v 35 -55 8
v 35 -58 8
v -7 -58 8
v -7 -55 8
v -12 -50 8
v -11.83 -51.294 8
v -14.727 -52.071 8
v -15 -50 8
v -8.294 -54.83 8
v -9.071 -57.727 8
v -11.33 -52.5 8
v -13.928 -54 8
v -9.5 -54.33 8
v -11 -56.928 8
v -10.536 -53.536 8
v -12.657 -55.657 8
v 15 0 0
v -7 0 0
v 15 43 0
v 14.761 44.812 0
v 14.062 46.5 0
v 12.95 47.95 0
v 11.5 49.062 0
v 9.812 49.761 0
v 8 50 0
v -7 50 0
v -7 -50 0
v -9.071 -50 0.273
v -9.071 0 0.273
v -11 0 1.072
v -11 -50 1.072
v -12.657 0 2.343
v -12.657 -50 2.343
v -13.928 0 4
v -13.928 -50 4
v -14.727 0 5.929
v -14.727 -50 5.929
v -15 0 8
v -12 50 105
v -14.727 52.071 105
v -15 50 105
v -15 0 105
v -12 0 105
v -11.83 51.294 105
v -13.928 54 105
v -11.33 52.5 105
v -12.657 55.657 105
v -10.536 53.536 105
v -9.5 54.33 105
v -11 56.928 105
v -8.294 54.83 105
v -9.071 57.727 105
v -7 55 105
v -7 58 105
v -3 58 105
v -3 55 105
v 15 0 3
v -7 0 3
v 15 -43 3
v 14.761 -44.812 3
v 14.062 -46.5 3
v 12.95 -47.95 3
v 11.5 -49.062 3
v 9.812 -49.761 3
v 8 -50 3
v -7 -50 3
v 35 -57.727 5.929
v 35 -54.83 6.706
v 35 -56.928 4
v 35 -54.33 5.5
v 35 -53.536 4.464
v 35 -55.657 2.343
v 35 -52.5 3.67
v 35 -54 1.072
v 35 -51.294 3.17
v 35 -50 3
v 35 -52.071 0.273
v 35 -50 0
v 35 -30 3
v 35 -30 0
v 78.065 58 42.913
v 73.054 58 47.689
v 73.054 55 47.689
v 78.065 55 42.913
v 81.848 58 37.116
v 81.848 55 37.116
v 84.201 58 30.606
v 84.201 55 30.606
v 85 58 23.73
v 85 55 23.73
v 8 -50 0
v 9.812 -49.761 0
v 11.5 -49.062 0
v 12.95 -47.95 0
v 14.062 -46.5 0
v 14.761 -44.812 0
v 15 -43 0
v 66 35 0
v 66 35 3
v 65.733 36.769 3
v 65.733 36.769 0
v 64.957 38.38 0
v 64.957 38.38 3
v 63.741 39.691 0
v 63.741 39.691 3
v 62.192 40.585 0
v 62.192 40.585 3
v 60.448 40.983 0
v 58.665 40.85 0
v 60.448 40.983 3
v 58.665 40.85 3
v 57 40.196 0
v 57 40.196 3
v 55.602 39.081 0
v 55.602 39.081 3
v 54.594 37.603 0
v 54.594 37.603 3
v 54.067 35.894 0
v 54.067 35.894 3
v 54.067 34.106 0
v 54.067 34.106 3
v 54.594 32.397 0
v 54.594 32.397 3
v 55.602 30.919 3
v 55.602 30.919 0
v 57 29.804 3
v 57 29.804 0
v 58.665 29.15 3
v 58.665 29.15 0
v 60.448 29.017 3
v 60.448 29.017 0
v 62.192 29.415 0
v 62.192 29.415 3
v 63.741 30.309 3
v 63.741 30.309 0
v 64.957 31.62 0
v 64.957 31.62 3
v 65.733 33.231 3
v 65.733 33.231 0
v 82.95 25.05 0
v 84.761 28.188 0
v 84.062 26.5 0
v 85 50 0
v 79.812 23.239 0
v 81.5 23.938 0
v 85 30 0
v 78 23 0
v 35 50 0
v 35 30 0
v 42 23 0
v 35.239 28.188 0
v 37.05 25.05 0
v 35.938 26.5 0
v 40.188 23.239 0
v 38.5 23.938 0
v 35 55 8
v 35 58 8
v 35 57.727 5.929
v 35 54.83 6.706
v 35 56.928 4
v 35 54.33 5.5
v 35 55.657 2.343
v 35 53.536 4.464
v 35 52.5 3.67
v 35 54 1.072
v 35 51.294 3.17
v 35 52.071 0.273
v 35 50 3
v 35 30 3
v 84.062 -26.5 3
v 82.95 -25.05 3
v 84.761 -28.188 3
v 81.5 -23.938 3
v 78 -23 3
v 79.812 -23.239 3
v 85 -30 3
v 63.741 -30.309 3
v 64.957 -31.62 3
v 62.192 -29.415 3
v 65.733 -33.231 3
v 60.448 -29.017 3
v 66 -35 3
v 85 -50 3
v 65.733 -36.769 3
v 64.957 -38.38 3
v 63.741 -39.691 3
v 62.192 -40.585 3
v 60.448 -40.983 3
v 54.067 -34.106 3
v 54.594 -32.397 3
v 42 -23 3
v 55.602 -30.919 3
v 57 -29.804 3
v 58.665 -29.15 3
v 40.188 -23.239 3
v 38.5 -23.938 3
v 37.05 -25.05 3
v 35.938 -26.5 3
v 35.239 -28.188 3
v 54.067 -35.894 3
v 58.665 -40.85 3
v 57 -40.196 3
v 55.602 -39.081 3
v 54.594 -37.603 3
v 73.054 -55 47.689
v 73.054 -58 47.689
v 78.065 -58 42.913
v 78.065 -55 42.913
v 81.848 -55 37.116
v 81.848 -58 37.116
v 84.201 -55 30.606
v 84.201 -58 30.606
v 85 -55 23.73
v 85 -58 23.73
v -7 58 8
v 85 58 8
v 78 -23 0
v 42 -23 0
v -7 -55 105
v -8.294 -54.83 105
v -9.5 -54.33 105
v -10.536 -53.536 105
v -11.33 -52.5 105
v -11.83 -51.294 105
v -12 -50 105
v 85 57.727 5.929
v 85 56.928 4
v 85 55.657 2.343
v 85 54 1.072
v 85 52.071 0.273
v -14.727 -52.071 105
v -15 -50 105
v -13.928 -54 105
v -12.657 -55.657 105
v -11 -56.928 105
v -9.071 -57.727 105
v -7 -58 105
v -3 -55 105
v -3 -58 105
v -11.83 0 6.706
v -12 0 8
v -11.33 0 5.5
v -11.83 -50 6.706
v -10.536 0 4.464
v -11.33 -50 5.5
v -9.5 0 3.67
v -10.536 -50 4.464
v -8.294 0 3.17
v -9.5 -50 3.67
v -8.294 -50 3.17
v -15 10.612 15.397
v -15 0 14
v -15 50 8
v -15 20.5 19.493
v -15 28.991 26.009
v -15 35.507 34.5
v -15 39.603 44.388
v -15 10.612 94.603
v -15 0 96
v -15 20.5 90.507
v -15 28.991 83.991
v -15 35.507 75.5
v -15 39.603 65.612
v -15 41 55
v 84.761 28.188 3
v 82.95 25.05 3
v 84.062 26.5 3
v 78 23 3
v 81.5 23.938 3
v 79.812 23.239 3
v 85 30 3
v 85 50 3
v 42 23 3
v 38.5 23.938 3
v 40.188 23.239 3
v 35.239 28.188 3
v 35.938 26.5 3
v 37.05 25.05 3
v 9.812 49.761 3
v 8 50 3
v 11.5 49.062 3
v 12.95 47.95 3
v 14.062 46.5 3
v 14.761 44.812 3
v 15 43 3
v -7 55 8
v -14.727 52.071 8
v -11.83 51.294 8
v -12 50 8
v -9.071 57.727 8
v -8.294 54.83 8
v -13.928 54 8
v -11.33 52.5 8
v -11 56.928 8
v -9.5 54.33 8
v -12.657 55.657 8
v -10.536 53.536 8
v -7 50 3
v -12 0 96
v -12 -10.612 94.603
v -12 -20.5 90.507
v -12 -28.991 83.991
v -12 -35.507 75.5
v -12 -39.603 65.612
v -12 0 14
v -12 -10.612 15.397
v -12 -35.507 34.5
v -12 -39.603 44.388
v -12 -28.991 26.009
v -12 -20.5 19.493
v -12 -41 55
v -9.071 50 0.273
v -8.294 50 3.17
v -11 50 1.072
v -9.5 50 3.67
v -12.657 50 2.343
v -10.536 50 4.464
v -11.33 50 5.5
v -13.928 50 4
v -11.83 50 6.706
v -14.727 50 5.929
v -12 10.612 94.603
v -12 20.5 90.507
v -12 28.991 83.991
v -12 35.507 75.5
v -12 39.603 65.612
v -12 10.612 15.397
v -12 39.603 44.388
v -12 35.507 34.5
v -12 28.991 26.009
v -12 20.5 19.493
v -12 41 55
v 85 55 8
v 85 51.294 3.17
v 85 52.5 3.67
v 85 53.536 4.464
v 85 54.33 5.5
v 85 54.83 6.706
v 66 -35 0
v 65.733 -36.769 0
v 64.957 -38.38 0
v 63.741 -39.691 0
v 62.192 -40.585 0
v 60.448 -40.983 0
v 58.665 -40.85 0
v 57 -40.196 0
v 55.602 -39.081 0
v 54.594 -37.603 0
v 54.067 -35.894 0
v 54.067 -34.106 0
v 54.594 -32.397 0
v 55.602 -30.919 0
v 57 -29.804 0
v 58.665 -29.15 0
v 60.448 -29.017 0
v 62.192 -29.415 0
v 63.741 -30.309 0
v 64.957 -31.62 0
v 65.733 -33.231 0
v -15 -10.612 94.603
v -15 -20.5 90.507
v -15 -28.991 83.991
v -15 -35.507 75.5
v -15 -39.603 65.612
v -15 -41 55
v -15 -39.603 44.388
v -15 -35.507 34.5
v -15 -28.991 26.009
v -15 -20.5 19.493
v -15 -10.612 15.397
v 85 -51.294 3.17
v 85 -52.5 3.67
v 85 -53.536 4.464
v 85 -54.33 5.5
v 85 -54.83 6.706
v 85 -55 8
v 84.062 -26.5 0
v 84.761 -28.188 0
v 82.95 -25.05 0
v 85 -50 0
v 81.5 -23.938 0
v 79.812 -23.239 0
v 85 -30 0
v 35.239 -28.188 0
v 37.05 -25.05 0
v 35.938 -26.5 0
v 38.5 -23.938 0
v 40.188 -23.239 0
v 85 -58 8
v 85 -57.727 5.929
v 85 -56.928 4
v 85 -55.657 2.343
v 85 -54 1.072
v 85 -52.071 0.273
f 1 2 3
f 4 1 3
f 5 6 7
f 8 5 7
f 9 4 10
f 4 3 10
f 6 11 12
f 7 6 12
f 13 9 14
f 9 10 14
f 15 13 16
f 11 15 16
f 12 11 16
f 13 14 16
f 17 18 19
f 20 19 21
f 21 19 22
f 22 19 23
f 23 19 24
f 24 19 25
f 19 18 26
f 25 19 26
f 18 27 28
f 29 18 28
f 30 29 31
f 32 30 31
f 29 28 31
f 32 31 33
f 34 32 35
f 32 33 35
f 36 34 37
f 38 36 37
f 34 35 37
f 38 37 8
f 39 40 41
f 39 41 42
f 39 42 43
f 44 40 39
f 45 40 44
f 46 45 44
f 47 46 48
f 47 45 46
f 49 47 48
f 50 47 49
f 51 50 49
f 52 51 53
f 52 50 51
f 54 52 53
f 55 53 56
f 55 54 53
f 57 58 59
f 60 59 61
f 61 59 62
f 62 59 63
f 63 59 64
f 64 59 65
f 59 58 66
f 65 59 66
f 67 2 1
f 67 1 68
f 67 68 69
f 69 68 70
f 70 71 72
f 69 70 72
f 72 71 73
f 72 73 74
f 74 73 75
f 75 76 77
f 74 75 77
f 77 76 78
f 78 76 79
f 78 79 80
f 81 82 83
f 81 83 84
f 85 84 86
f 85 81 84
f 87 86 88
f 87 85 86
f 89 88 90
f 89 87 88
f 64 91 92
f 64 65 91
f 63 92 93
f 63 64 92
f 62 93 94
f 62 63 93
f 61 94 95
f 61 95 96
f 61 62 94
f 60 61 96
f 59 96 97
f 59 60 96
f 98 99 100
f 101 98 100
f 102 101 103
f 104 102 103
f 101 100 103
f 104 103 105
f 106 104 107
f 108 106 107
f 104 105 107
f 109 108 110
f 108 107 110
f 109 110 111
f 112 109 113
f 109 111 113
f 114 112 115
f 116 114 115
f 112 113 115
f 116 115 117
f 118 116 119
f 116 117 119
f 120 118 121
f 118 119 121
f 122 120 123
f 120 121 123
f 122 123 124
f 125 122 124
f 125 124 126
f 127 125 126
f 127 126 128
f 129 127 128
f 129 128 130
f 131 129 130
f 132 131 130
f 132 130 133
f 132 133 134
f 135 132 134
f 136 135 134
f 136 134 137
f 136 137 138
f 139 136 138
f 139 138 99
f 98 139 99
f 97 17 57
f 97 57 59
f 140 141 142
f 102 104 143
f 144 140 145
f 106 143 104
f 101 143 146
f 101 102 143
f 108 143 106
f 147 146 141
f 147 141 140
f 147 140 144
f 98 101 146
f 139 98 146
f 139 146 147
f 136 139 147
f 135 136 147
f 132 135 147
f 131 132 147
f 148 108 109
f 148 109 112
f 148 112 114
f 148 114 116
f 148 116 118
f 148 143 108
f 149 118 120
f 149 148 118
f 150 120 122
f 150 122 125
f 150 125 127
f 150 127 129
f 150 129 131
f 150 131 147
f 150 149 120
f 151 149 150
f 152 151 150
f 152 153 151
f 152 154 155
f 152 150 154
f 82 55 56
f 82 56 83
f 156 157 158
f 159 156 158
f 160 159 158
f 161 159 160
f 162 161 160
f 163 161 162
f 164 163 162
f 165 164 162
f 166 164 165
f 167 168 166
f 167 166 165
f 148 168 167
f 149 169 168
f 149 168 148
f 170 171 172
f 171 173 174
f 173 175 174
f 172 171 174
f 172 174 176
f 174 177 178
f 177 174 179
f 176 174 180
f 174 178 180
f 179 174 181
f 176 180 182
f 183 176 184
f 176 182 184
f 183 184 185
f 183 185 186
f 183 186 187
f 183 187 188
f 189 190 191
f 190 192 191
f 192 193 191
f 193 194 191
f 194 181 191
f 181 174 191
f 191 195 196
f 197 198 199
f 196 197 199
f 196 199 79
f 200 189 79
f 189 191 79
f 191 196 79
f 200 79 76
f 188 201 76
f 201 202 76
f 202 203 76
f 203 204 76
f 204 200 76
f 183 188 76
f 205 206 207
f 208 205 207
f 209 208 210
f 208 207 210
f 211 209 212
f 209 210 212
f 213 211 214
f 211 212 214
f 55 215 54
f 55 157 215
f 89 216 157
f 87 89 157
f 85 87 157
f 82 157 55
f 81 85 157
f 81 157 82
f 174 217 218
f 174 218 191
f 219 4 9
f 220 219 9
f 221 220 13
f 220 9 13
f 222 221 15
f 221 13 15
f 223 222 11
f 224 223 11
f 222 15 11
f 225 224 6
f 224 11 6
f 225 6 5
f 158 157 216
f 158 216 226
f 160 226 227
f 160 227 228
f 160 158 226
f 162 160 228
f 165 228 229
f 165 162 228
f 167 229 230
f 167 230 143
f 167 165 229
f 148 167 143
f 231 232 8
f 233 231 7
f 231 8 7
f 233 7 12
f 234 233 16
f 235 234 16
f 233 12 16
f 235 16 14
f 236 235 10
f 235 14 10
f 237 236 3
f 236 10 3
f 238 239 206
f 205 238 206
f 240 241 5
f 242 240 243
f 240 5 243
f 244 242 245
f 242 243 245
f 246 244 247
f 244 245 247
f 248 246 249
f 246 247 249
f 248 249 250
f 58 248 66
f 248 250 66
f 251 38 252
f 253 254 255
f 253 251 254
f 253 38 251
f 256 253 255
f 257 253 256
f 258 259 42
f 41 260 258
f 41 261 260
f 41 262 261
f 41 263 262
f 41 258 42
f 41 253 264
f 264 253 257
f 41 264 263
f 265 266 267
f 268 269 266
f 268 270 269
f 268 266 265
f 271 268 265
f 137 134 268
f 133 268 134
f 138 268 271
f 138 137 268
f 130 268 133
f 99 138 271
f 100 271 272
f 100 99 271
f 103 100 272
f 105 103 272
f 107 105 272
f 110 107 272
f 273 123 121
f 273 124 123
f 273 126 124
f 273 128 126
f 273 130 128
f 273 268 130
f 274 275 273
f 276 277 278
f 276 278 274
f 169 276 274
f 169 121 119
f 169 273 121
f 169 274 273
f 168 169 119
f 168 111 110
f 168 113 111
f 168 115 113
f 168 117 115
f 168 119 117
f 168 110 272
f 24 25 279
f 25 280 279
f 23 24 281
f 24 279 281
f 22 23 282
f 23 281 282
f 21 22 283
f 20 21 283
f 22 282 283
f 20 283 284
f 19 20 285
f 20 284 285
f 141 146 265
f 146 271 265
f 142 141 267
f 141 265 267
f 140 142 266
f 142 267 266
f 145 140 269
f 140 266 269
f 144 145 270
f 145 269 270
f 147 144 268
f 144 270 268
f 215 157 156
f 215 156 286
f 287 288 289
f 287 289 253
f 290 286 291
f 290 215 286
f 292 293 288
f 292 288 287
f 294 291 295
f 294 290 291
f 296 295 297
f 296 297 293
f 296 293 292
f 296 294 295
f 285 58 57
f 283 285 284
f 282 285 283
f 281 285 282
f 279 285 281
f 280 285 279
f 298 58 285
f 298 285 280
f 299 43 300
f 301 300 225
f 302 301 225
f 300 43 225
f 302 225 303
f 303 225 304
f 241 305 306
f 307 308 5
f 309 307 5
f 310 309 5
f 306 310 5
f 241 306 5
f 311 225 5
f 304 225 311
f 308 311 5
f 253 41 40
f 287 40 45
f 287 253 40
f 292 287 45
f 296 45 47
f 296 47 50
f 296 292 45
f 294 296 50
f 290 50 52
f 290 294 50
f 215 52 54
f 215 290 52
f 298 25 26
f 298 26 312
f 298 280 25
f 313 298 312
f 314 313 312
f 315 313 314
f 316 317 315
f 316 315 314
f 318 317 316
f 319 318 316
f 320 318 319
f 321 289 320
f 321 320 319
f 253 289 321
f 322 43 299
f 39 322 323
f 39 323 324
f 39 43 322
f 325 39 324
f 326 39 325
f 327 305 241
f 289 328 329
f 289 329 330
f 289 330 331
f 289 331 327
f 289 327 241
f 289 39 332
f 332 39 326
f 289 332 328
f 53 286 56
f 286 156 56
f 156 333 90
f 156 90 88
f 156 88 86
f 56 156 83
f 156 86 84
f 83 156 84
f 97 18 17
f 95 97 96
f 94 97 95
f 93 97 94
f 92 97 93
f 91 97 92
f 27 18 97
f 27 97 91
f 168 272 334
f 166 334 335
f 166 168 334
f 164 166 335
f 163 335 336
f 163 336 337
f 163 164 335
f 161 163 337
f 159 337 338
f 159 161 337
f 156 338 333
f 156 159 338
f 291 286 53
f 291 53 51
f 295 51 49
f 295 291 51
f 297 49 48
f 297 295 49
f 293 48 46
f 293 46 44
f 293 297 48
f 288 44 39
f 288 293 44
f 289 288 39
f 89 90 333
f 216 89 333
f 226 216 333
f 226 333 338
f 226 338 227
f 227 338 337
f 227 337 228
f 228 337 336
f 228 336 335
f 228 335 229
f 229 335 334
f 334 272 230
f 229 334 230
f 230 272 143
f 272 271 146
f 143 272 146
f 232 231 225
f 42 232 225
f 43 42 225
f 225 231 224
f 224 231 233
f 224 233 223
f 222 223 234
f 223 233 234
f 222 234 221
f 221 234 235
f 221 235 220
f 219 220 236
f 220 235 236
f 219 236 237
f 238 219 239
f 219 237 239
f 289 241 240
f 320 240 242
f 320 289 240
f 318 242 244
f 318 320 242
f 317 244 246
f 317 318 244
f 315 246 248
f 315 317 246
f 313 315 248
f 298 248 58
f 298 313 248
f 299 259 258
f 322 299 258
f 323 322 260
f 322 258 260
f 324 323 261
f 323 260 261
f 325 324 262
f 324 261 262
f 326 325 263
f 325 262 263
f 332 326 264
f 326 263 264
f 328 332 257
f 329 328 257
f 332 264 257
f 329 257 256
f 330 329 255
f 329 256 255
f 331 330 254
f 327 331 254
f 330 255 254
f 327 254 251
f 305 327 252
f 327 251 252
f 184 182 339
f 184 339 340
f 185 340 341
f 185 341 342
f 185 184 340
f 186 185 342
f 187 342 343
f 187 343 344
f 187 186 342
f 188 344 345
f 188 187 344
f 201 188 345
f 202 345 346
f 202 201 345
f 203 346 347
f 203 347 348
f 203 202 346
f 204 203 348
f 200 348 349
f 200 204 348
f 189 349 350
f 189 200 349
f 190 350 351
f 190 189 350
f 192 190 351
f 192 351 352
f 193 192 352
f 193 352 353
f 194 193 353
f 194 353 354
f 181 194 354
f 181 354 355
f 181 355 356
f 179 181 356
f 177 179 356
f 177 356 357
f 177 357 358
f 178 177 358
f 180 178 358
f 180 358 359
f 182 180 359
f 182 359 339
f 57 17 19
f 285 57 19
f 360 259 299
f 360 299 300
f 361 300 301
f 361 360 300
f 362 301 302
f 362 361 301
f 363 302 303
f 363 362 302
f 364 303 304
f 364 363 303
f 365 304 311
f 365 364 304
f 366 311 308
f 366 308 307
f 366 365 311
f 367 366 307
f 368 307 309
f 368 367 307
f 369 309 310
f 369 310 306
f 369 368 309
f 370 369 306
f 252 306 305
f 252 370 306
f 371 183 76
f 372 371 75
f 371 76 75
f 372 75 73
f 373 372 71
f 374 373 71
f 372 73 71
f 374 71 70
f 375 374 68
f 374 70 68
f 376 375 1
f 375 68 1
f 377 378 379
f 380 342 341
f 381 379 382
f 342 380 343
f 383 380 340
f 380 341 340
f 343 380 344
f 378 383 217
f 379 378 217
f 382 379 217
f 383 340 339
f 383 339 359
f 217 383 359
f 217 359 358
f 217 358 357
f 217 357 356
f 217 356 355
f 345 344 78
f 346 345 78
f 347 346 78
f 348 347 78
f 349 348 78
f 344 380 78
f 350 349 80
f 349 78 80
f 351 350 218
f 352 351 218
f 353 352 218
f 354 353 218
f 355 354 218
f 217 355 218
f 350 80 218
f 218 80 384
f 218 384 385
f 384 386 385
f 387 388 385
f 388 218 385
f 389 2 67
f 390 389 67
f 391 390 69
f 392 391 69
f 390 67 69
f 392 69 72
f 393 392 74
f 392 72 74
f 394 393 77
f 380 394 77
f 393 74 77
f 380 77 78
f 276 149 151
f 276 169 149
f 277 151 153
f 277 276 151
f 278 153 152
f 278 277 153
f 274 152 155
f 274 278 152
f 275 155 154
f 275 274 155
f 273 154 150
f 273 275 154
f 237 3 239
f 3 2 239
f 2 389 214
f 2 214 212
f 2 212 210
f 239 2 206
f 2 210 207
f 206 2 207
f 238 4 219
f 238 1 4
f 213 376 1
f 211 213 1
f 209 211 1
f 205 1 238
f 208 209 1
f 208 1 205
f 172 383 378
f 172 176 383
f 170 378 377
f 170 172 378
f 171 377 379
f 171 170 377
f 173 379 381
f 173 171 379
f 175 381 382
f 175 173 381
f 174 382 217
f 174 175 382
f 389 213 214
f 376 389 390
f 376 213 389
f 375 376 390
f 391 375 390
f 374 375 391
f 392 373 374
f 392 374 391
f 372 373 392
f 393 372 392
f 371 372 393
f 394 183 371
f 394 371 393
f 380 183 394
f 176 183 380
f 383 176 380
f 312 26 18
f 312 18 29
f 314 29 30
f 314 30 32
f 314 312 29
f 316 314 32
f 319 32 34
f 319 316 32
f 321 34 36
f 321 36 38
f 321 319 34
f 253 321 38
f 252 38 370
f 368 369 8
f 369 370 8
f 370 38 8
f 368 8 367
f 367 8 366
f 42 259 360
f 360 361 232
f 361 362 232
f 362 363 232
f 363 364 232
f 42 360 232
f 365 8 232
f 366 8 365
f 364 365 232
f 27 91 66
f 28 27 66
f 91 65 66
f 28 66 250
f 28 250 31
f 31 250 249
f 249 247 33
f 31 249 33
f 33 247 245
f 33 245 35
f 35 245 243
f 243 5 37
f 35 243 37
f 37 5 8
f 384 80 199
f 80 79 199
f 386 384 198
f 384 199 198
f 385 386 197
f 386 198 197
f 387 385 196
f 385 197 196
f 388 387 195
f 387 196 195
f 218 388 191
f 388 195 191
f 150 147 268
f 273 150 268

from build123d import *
from build123d.topology import SkipClean

# Parameters (mm, degrees)
SKETCH1_W                    = 100
SKETCH1_H                    = 30
BASE_FLANGE1_DEPTH           = 3
EDGE_FLANGE1_STRIP_W         = 22
EDGE_FLANGE1_STRIP_H         = 3
EDGE_FLANGE1_STRIP_CUT_DEPTH = 100
EDGE_FLANGE1_DEPTH           = 100
EDGE_FLANGE2_DEPTH           = 97
EDGE_FLANGE2_START           = 3
EDGE_FLANGE2_FLAT_DEPTH      = 3
EDGE_FLANGE3_DEPTH           = 50
SKETCH16_R                   = 6
CUT_EXTRUDE1_DEPTH           = 10
SKETCH17_R                   = 41
CUT_EXTRUDE2_DEPTH           = 10
FILLET1_R                    = 7


# Sheet-metal steps are written as plain solids
with BuildPart() as part:
    # Sketch1 → Base-Flange1 (new body)
    with BuildSketch(Plane(origin=(0, 0, 0), x_dir=(0, 1, 0), z_dir=(0, 0, 1))):
        Rectangle(SKETCH1_W, SKETCH1_H)
    extrude(amount=BASE_FLANGE1_DEPTH)

    # Edge-Flange1 strip (across the edge) → Edge-Flange1 strip cut (cut)
    with BuildSketch(Plane(origin=(-15, 50, 3), x_dir=(1, 0, 0), z_dir=(0, -1, 0))):
        with Locations((-3, -1.5)):
            Rectangle(EDGE_FLANGE1_STRIP_W, EDGE_FLANGE1_STRIP_H)
    extrude(amount=EDGE_FLANGE1_STRIP_CUT_DEPTH, mode=Mode.SUBTRACT)

    # Edge-Flange1 section (across the edge) → Edge-Flange1 (add)
    with BuildSketch(Plane(origin=(-15, 50, 3), x_dir=(1, 0, 0), z_dir=(0, -1, 0))):
        with BuildLine():
            Line((0, 5), (0, 102))
            Line((0, 102), (3, 102))
            Line((3, 102), (3, 5))
            ThreePointArc((3, 5), (4.464466094, 1.464466094), (8, 0))
            Line((8, 0), (8, -3))
            ThreePointArc((8, -3), (2.343145751, -0.656854249), (0, 5))
        make_face()
    extrude(amount=EDGE_FLANGE1_DEPTH)

    # Edge-Flange2 bend section (across the edge) → Edge-Flange2 (add)
    with BuildSketch(Plane(origin=(-12, 55, 8), x_dir=(0, -1, 0), z_dir=(0, 0, 1))):
        with BuildLine():
            Line((-3, 5), (0, 5))
            ThreePointArc((0, 5), (1.464466094, 1.464466094), (5, 0))
            Line((5, 0), (5, -3))
            ThreePointArc((5, -3), (-0.656854249, -0.656854249), (-3, 5))
        make_face()
    extrude(amount=EDGE_FLANGE2_DEPTH)

    # Edge-Flange2 profile (on flange) → Edge-Flange2 flat (add)
    with BuildSketch(Plane(origin=(-12, 55, 0), x_dir=(0, 0, 1), z_dir=(0, 1, 0)).offset(EDGE_FLANGE2_START)):
        with BuildLine():
            Line((8, 5), (105, 5))
            Line((105, 5), (105, 9))
            Line((105, 9), (47.688860651, 85.054450695))
            ThreePointArc((47.688860651, 85.054450695), (37.115729743, 93.848030848), (23.729795349, 97))
            Line((23.729795349, 97), (8, 97))
            Line((8, 97), (8, 5))
        make_face()
    extrude(amount=-EDGE_FLANGE2_FLAT_DEPTH)

    # Edge-Flange3 section (across the edge) → Edge-Flange3 (add)
    with BuildSketch(Plane(origin=(35, 55, 3), x_dir=(0, 0, 1), z_dir=(1, 0, 0))):
        with BuildLine():
            Line((-3, 5), (-3, 32))
            Line((-3, 32), (0, 32))
            Line((0, 32), (0, 5))
            ThreePointArc((0, 5), (1.464466094, 1.464466094), (5, 0))
            Line((5, 0), (5, -3))
            ThreePointArc((5, -3), (-0.656854249, -0.656854249), (-3, 5))
        make_face()
    extrude(amount=EDGE_FLANGE3_DEPTH)

    # Sketch16 → Cut-Extrude1 (cut)
    with BuildSketch(Plane.XY.offset(3)):
        with Locations((60, 35)):
            Circle(SKETCH16_R)
    extrude(amount=-CUT_EXTRUDE1_DEPTH, mode=Mode.SUBTRACT)

    # Sketch17 → Cut-Extrude2 (cut)
    with BuildSketch(Plane(origin=(-15, 0, 0), x_dir=(0, -1, 0), z_dir=(-1, 0, 0))):
        with Locations(Location((0, 55, 0), (0, 0, 90))):
            Circle(SKETCH17_R)
    extrude(amount=-CUT_EXTRUDE2_DEPTH, mode=Mode.SUBTRACT)

    # Fillet1
    fillet1_edges = [part.edges().sort_by_distance(p)[0] for p in [
        (15, 50, 1.5),
        (35, 23, 1.5),
        (85, 23, 1.5),
    ]]
    fillet(fillet1_edges, radius=FILLET1_R)

    # SurfaceCut1
    split(bisect_by=Plane(origin=(0, 0, 0), x_dir=(-1, 0, 0), z_dir=(0, 1, 0)), keep=Keep.TOP)

    # Mirror2: part across plane


with BuildPart() as part_1:
    with SkipClean():  # the faces are left unmerged after this step: merging them gives an invalid solid
        add(part.part)
        add(part.part.mirror(Plane.ZX))

    # SurfaceCut2
    split(bisect_by=Plane(origin=(0, 0, 0), x_dir=(-1, 0, 0), z_dir=(0, 1, 0)), keep=Keep.TOP)

    # Mirror3: part across plane


with BuildPart() as part_2:
    with SkipClean():  # the faces are left unmerged after this step: merging them gives an invalid solid
        add(part_1.part)
        add(part_1.part.mirror(Plane.ZX))


solid = part_2.part
